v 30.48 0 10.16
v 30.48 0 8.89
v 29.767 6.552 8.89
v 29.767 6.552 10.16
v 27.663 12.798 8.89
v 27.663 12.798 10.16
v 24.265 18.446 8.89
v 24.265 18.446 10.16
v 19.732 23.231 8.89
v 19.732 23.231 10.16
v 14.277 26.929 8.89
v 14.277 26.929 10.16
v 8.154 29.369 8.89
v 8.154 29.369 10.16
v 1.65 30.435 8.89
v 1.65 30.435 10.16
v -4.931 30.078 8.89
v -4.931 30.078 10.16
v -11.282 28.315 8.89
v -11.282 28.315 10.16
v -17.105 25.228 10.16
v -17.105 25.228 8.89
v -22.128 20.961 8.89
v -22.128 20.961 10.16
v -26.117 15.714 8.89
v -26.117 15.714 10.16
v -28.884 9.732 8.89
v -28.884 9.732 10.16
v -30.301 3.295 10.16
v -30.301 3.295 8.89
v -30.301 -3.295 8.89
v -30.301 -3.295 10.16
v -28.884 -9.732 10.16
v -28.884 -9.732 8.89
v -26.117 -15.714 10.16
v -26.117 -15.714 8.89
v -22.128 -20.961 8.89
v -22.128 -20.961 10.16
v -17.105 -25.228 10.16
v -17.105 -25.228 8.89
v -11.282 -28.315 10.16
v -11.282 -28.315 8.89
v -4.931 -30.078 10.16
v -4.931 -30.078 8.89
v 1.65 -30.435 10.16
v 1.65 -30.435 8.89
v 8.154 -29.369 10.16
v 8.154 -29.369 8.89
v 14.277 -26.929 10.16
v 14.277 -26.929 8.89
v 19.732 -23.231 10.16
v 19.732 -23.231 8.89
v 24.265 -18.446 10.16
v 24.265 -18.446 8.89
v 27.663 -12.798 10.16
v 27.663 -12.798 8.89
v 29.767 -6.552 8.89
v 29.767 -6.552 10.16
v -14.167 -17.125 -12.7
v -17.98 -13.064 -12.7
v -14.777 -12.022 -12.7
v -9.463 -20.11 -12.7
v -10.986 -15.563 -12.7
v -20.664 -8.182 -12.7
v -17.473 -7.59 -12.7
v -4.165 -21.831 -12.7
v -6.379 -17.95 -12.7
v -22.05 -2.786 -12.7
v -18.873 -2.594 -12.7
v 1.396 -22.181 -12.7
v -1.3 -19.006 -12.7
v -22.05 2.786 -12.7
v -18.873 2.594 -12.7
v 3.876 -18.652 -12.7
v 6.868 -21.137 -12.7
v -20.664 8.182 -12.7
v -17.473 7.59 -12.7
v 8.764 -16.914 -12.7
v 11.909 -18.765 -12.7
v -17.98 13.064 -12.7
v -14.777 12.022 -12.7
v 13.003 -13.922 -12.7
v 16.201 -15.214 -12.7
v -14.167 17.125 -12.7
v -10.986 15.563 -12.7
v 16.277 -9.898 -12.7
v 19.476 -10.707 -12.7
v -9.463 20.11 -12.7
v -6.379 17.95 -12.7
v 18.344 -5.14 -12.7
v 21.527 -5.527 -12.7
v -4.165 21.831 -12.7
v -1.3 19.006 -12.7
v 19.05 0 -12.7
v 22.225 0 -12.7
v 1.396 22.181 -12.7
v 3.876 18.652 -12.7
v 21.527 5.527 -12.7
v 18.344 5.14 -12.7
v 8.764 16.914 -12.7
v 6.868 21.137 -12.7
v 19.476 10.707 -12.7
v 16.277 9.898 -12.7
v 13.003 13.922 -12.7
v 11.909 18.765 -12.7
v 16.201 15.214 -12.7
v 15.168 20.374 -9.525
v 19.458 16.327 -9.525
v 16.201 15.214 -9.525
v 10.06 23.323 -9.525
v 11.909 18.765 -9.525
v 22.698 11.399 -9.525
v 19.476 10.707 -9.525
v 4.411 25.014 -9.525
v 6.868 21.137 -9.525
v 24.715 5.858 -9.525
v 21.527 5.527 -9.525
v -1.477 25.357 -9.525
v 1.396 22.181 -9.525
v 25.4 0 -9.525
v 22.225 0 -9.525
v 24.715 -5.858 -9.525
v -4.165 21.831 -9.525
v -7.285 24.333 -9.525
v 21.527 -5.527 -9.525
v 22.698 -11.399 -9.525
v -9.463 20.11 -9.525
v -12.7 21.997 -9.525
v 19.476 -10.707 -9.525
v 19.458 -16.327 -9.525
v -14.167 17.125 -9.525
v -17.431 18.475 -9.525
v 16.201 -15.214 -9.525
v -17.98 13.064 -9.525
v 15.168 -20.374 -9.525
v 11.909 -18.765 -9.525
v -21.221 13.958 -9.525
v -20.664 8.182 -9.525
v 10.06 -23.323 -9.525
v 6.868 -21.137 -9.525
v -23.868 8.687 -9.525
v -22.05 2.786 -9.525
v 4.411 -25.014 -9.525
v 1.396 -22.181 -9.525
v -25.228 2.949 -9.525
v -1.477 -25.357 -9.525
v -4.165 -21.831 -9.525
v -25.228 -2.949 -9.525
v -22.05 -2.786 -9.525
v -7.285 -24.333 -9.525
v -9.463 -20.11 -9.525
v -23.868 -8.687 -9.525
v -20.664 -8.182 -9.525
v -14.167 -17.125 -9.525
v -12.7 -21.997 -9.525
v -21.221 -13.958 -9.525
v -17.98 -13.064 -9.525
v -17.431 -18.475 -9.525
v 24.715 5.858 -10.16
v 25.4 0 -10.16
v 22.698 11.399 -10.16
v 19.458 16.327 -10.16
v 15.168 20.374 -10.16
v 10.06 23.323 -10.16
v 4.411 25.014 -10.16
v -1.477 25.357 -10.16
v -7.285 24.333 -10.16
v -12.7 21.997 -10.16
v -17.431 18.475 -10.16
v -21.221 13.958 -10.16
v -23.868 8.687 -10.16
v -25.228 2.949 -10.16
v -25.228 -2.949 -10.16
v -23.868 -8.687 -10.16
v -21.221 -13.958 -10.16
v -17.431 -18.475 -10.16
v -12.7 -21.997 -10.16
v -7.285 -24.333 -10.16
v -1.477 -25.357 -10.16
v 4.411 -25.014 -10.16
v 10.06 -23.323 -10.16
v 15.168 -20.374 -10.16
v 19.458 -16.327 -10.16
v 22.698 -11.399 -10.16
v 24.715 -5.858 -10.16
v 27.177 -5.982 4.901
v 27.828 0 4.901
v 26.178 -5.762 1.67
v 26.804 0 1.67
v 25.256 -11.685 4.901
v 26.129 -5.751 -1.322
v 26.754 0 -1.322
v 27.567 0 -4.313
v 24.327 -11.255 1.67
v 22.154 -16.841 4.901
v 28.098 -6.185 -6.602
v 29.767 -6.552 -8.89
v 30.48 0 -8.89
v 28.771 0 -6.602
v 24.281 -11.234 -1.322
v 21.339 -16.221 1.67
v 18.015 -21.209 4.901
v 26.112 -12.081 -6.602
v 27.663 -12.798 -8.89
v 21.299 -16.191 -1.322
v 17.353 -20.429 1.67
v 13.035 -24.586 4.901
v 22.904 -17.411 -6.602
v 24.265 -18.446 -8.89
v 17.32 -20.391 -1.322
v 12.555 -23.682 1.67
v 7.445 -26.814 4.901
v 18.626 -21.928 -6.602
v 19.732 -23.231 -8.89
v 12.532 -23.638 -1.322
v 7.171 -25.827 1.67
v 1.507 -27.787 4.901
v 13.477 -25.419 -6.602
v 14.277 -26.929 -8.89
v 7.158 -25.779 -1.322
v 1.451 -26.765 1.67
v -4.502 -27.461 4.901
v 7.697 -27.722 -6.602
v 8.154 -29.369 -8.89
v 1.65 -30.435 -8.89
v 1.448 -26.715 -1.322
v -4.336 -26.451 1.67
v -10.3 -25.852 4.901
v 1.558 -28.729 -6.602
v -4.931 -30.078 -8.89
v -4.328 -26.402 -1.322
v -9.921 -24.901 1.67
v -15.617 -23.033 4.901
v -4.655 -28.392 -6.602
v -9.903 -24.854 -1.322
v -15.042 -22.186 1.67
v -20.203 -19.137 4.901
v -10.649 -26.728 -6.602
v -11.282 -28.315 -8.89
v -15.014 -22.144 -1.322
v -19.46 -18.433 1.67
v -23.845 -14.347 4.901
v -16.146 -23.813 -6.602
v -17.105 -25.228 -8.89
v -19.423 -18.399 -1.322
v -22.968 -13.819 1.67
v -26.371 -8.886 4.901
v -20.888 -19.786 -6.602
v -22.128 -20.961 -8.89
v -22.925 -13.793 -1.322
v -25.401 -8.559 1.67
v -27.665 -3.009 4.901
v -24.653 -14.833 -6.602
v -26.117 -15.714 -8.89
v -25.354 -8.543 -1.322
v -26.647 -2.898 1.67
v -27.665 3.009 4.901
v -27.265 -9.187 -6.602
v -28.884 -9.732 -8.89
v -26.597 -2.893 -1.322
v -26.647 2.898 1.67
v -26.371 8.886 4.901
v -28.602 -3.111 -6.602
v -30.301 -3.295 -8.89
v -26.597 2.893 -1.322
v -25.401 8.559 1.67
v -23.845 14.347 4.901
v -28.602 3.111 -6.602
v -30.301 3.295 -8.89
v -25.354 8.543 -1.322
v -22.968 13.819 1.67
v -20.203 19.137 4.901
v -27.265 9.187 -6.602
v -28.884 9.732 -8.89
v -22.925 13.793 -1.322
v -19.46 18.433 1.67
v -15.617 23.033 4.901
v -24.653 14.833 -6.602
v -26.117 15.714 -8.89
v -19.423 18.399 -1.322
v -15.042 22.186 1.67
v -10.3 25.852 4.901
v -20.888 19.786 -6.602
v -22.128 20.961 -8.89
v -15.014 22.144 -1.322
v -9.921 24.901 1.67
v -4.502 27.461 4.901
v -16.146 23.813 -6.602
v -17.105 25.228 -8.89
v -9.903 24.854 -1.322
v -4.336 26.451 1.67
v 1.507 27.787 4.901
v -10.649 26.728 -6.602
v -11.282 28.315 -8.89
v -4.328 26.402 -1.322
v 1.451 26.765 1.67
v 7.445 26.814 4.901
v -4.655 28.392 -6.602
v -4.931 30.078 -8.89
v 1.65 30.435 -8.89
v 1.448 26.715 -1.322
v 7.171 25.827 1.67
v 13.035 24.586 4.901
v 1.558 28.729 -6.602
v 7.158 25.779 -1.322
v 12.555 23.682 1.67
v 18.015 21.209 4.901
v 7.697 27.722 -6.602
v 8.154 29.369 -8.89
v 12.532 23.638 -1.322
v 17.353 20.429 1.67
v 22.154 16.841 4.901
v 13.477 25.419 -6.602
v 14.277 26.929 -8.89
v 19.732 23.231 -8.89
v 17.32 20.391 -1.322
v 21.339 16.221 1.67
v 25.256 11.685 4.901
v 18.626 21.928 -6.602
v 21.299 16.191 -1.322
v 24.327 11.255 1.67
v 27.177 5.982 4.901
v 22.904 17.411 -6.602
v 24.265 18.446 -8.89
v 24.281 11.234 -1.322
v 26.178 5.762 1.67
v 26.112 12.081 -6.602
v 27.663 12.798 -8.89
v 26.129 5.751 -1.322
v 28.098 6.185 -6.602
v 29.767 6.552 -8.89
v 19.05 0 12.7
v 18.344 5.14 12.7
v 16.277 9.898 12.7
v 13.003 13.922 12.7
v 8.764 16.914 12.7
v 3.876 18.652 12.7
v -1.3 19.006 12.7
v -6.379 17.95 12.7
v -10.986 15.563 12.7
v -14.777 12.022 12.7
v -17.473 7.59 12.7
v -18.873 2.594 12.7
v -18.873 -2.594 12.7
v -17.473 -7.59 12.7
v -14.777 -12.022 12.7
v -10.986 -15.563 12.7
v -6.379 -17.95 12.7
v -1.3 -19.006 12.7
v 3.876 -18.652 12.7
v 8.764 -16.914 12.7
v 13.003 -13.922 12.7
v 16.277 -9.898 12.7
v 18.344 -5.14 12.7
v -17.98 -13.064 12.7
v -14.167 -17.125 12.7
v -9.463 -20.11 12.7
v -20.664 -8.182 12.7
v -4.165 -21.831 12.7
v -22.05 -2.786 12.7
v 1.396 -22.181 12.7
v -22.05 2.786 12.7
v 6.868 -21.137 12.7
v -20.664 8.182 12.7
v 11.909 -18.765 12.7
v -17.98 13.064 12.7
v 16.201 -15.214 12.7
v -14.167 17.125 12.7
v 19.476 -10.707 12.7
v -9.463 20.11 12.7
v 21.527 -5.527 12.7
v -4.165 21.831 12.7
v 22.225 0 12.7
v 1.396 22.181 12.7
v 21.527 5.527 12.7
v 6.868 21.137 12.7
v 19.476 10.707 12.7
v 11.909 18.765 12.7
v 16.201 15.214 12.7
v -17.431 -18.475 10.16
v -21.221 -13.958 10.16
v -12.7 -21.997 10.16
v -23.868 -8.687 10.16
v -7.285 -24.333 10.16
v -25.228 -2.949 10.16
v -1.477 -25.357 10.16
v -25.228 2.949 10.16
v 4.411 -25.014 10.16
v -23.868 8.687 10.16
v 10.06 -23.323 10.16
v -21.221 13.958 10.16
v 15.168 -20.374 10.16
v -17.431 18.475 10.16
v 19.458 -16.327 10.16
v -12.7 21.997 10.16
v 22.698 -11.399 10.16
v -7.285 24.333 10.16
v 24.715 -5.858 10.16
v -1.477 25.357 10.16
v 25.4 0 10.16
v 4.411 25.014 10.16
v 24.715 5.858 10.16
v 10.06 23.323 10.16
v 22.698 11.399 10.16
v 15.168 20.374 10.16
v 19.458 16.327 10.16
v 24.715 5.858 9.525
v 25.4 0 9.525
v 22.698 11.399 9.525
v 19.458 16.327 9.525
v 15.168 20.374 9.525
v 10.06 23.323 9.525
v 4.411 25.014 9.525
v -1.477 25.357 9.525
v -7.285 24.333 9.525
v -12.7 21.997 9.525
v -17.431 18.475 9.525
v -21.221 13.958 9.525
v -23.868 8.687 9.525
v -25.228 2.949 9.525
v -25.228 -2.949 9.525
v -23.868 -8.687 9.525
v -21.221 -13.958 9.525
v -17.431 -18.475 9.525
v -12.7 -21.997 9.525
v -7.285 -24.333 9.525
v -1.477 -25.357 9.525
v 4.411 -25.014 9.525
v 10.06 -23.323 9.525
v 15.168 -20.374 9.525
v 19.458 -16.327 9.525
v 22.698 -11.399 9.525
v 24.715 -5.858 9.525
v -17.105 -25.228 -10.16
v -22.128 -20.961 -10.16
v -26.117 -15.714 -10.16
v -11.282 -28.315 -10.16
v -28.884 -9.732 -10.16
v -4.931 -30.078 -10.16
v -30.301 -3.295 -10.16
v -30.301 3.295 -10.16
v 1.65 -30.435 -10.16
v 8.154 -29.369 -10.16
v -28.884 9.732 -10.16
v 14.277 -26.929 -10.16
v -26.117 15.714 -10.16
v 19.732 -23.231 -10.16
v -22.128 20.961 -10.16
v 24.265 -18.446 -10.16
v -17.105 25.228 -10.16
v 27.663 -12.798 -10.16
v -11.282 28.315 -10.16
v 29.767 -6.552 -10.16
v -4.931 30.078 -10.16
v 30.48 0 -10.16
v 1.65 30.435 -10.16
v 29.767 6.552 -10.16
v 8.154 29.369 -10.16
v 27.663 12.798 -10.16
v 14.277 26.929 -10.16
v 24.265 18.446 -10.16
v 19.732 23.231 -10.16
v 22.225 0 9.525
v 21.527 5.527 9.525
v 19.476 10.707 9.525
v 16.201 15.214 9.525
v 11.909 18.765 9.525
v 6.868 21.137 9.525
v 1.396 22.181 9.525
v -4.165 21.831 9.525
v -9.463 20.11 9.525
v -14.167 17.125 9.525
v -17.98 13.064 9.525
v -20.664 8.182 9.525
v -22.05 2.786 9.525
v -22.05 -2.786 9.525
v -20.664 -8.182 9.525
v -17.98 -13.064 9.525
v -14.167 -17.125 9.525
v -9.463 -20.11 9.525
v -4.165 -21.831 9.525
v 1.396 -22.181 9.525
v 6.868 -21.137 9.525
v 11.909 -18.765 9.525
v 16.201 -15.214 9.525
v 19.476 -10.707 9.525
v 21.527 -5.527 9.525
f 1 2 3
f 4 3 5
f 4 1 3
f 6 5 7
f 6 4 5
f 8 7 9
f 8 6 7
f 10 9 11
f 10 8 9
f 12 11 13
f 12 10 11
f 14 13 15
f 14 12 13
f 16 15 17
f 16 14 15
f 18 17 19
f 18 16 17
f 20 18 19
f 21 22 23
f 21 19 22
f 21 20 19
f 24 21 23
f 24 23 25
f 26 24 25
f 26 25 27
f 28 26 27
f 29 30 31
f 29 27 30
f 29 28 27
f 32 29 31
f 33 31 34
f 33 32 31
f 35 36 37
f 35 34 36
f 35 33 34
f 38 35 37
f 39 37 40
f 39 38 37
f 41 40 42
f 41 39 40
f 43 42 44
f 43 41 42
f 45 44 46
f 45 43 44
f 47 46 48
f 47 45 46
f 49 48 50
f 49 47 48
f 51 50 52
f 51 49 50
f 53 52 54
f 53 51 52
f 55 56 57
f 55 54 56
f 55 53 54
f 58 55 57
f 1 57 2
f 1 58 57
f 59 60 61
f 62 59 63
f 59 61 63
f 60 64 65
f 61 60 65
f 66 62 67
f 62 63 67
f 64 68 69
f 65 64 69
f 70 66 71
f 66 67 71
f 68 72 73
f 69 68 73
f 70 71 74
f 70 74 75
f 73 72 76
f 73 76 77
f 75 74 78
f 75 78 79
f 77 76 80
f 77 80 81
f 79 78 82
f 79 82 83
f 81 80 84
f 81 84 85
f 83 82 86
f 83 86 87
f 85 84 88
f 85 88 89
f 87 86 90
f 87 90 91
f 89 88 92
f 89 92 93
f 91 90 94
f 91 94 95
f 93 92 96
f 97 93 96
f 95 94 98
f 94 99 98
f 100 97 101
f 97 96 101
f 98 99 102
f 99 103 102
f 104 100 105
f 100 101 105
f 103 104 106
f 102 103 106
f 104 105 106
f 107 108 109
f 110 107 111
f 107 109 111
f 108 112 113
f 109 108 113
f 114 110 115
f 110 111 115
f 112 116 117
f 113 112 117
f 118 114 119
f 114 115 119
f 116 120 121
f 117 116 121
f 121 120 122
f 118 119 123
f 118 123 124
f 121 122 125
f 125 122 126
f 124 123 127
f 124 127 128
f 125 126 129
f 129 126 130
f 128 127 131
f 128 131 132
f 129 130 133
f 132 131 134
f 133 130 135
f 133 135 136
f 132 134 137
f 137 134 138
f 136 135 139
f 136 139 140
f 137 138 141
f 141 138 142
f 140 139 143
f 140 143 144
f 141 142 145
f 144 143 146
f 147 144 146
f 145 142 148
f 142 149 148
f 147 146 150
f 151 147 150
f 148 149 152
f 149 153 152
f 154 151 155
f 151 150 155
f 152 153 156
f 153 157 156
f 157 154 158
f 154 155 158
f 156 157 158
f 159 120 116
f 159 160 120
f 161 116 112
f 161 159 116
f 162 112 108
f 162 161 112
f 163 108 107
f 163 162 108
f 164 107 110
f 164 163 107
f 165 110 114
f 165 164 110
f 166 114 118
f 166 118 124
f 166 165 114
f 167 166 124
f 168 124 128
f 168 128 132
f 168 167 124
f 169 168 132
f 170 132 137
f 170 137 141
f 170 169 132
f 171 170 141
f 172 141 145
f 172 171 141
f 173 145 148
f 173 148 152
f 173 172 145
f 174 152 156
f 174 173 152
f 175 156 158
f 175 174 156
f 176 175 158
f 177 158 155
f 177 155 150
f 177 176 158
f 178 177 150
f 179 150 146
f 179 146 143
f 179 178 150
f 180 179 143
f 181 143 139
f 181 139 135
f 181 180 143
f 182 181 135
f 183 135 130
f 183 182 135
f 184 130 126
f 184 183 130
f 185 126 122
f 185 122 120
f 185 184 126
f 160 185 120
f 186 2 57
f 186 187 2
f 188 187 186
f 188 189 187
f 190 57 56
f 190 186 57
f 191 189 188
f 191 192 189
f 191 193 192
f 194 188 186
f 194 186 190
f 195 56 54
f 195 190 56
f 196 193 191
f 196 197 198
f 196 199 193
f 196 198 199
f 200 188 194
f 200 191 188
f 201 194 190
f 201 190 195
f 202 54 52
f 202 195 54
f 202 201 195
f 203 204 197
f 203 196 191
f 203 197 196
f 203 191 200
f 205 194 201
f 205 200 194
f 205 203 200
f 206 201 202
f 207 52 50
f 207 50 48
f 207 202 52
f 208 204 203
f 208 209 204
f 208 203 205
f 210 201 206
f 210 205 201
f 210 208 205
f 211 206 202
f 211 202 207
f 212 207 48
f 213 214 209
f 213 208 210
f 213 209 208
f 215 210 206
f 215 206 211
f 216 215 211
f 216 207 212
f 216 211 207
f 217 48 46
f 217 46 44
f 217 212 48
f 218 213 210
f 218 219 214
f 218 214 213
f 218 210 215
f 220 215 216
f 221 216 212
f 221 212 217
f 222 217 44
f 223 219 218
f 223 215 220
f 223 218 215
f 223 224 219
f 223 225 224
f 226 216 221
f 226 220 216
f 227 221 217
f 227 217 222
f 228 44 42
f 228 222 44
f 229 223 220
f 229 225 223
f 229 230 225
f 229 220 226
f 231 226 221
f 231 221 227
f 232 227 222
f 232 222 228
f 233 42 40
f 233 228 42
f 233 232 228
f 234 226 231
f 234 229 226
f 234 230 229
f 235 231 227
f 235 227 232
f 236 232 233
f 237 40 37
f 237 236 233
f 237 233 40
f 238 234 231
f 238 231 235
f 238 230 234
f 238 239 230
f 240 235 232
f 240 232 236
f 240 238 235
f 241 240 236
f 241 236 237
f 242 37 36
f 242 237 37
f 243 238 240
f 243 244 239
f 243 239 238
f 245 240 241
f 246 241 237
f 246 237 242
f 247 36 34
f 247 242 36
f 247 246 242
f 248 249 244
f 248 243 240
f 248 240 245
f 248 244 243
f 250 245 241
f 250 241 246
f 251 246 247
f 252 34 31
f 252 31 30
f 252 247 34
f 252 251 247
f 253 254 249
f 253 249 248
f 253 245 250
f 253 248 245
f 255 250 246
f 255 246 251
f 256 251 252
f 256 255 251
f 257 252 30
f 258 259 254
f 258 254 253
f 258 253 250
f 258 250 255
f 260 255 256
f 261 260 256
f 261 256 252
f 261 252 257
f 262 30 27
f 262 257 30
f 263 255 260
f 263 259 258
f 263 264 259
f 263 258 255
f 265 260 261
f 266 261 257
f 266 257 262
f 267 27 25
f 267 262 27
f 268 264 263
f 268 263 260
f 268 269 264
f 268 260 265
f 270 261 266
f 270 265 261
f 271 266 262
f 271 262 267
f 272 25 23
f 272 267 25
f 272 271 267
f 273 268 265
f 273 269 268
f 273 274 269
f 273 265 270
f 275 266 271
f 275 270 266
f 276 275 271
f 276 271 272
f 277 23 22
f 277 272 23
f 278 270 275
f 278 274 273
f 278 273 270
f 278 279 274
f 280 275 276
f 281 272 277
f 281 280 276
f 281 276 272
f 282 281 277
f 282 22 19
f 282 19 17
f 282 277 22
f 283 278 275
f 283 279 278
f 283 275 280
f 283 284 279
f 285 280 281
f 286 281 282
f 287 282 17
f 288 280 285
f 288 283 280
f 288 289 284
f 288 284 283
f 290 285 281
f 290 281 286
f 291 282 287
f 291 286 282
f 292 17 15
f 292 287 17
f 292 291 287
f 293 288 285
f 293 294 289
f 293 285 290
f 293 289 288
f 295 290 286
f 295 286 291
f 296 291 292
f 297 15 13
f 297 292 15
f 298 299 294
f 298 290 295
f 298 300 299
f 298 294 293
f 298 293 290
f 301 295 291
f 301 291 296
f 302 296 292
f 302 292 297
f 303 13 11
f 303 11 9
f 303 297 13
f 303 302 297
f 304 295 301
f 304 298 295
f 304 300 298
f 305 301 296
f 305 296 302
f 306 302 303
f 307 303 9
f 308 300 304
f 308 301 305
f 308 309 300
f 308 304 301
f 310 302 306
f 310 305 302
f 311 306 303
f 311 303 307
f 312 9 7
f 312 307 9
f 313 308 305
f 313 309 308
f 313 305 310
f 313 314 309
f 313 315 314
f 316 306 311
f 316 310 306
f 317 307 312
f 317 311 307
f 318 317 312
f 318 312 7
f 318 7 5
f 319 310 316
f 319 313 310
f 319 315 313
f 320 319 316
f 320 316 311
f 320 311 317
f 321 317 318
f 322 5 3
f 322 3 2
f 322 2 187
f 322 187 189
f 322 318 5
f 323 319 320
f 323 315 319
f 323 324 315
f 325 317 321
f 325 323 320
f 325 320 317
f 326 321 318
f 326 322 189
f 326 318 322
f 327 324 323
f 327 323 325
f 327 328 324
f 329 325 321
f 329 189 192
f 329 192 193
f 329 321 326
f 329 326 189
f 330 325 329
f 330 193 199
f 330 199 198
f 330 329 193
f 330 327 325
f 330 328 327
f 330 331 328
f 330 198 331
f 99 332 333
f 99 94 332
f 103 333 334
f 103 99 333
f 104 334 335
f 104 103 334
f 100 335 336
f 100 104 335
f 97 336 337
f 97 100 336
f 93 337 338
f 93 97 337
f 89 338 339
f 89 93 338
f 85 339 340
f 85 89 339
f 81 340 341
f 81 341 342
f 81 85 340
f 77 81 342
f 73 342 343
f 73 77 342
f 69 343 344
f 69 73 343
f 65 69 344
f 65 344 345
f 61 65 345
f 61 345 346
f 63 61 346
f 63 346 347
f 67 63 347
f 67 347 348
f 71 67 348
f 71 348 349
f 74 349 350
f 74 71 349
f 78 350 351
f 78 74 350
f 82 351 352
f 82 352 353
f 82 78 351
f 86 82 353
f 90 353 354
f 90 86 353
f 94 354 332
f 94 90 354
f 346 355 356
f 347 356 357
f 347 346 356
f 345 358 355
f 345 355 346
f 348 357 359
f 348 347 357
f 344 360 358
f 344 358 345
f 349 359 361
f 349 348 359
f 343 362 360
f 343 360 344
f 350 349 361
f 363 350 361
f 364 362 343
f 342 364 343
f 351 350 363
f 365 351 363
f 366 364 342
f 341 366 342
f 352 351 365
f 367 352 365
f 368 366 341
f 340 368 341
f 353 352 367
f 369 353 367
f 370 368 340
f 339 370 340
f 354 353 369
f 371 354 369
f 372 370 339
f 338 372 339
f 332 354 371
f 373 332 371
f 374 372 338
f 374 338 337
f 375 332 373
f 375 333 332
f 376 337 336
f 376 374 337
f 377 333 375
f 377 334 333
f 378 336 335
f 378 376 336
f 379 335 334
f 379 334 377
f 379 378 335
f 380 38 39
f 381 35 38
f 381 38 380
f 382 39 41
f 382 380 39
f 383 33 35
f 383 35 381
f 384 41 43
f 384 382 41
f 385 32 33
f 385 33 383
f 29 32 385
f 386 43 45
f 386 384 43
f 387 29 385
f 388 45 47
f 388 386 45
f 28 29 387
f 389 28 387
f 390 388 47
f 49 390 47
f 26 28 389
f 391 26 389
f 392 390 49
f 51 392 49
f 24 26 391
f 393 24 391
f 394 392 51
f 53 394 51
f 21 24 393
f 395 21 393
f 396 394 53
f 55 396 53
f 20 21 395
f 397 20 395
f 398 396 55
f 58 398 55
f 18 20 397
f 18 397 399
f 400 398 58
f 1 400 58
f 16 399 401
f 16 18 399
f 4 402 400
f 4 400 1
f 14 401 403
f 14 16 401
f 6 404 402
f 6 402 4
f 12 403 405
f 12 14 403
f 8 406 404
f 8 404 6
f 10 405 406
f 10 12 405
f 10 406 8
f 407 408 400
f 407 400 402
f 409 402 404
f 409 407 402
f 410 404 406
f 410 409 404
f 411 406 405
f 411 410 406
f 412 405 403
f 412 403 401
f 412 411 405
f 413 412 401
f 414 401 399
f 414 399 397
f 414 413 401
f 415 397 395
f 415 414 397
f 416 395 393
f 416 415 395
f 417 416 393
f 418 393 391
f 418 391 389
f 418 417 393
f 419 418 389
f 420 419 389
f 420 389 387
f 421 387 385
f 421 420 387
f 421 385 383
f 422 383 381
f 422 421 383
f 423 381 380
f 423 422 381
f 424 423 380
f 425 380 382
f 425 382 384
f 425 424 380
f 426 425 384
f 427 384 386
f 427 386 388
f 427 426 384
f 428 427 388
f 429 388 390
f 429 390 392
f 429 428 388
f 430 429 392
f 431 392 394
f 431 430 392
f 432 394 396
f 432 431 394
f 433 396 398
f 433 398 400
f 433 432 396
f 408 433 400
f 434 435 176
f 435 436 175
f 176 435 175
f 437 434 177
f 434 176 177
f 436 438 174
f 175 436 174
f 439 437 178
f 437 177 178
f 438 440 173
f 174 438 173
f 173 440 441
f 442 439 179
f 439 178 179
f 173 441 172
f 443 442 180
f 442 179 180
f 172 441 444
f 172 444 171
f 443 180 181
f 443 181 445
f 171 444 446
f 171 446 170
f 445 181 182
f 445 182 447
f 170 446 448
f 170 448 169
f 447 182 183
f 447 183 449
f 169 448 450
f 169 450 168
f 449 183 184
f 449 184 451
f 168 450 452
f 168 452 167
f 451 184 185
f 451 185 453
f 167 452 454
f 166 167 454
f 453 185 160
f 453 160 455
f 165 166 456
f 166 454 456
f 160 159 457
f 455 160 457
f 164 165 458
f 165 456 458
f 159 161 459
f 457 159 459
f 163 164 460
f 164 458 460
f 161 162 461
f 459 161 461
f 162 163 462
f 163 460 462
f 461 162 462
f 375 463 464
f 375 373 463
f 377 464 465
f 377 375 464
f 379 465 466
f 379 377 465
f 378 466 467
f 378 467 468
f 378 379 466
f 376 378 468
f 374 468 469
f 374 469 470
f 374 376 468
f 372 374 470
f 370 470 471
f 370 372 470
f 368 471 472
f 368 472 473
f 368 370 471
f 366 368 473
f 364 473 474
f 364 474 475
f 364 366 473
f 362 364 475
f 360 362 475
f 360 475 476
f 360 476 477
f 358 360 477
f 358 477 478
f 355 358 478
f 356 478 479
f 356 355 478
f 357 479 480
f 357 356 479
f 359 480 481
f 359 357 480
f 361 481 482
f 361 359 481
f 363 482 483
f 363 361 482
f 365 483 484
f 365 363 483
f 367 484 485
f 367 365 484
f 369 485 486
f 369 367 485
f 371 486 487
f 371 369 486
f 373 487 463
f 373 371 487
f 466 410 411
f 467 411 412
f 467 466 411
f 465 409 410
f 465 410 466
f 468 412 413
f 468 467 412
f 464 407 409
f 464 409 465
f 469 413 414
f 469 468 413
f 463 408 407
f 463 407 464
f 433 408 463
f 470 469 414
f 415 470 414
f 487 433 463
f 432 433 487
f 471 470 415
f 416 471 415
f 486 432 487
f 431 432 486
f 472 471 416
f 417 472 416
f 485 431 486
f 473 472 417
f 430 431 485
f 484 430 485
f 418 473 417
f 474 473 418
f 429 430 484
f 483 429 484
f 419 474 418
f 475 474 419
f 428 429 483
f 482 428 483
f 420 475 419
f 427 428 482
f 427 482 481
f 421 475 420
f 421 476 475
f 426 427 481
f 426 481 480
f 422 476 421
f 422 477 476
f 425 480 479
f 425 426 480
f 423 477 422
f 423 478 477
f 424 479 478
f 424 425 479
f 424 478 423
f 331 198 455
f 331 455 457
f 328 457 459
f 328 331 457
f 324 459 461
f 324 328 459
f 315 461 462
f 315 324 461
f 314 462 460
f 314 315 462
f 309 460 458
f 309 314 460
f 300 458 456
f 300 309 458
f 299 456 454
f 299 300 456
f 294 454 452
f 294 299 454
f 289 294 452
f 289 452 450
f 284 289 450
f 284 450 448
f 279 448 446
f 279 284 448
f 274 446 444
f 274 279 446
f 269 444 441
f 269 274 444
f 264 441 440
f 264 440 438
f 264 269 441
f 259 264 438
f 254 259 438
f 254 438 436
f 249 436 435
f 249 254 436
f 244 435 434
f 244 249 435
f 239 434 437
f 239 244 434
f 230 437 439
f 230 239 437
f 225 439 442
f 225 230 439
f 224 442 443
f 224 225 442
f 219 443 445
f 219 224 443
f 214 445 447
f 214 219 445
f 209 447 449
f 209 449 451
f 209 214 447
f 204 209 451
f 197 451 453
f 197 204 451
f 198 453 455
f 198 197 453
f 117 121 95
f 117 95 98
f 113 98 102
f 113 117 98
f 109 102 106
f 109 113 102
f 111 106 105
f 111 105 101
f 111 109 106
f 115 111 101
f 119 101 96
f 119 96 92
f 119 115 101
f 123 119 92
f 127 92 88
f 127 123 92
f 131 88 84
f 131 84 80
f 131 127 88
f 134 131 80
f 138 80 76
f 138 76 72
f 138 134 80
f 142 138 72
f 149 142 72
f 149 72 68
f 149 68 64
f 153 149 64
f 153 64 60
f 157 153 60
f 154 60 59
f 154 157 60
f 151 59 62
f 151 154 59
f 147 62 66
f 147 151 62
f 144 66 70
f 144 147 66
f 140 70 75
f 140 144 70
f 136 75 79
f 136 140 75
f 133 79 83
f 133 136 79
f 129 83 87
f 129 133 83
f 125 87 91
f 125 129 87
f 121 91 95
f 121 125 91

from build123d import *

# Parameters (mm, degrees)
SKETCH1_R           = 22.225
SKETCH1_R_2         = 19.05
BOSS_EXTRUDE1_DEPTH = 12.7
SKETCH2_R           = 25.4
SKETCH2_R_2         = 22.225
BOSS_EXTRUDE2_DEPTH = 9.525
SKETCH3_R           = 30.48
SKETCH3_R_2         = 25.4
BOSS_EXTRUDE3_DEPTH = 10.16


with BuildPart() as part:
    # Sketch1 → Boss-Extrude1 (new, symmetric)
    with BuildSketch(Plane.XY):
        Circle(SKETCH1_R)
        Circle(SKETCH1_R_2, mode=Mode.SUBTRACT)
    extrude(amount=BOSS_EXTRUDE1_DEPTH, both=True)

    # Sketch2 → Boss-Extrude2 (add, symmetric)
    with BuildSketch(Plane.XY):
        with Locations(Location((0, 0, 0), (0, 0, 180))):
            Circle(SKETCH2_R)
        Circle(SKETCH2_R_2, mode=Mode.SUBTRACT)
    extrude(amount=BOSS_EXTRUDE2_DEPTH, both=True)

    # Sketch3 → Boss-Extrude3 (add, symmetric)
    with BuildSketch(Plane.XY):
        Circle(SKETCH3_R)
        Circle(SKETCH3_R_2, mode=Mode.SUBTRACT)
    extrude(amount=BOSS_EXTRUDE3_DEPTH, both=True)

    # Sketch4 → Cut-Revolve2 (revolve, cut)
    with BuildSketch(Plane(origin=(0, 0, 0), x_dir=(0, 0, -1), z_dir=(1, 0, 0)), mode=Mode.PRIVATE) as cut_revolve2_sk:
        with BuildLine():
            Line((-8.89, 30.48), (8.89, 30.48))
            add(Edge.make_bspline(
                [(-8.89, 30.48), (0, 22.86), (8.89, 30.48)],
                knots=[0, 0, 0, 1, 1, 1], degree=2))
        make_face()
    revolve(cut_revolve2_sk.sketch.rotate(Axis((0, 0, 0), (0, 0, -1)), 90), axis=Axis((0, 0, 0), (0, 0, -1)), mode=Mode.SUBTRACT)


solid = part.part
